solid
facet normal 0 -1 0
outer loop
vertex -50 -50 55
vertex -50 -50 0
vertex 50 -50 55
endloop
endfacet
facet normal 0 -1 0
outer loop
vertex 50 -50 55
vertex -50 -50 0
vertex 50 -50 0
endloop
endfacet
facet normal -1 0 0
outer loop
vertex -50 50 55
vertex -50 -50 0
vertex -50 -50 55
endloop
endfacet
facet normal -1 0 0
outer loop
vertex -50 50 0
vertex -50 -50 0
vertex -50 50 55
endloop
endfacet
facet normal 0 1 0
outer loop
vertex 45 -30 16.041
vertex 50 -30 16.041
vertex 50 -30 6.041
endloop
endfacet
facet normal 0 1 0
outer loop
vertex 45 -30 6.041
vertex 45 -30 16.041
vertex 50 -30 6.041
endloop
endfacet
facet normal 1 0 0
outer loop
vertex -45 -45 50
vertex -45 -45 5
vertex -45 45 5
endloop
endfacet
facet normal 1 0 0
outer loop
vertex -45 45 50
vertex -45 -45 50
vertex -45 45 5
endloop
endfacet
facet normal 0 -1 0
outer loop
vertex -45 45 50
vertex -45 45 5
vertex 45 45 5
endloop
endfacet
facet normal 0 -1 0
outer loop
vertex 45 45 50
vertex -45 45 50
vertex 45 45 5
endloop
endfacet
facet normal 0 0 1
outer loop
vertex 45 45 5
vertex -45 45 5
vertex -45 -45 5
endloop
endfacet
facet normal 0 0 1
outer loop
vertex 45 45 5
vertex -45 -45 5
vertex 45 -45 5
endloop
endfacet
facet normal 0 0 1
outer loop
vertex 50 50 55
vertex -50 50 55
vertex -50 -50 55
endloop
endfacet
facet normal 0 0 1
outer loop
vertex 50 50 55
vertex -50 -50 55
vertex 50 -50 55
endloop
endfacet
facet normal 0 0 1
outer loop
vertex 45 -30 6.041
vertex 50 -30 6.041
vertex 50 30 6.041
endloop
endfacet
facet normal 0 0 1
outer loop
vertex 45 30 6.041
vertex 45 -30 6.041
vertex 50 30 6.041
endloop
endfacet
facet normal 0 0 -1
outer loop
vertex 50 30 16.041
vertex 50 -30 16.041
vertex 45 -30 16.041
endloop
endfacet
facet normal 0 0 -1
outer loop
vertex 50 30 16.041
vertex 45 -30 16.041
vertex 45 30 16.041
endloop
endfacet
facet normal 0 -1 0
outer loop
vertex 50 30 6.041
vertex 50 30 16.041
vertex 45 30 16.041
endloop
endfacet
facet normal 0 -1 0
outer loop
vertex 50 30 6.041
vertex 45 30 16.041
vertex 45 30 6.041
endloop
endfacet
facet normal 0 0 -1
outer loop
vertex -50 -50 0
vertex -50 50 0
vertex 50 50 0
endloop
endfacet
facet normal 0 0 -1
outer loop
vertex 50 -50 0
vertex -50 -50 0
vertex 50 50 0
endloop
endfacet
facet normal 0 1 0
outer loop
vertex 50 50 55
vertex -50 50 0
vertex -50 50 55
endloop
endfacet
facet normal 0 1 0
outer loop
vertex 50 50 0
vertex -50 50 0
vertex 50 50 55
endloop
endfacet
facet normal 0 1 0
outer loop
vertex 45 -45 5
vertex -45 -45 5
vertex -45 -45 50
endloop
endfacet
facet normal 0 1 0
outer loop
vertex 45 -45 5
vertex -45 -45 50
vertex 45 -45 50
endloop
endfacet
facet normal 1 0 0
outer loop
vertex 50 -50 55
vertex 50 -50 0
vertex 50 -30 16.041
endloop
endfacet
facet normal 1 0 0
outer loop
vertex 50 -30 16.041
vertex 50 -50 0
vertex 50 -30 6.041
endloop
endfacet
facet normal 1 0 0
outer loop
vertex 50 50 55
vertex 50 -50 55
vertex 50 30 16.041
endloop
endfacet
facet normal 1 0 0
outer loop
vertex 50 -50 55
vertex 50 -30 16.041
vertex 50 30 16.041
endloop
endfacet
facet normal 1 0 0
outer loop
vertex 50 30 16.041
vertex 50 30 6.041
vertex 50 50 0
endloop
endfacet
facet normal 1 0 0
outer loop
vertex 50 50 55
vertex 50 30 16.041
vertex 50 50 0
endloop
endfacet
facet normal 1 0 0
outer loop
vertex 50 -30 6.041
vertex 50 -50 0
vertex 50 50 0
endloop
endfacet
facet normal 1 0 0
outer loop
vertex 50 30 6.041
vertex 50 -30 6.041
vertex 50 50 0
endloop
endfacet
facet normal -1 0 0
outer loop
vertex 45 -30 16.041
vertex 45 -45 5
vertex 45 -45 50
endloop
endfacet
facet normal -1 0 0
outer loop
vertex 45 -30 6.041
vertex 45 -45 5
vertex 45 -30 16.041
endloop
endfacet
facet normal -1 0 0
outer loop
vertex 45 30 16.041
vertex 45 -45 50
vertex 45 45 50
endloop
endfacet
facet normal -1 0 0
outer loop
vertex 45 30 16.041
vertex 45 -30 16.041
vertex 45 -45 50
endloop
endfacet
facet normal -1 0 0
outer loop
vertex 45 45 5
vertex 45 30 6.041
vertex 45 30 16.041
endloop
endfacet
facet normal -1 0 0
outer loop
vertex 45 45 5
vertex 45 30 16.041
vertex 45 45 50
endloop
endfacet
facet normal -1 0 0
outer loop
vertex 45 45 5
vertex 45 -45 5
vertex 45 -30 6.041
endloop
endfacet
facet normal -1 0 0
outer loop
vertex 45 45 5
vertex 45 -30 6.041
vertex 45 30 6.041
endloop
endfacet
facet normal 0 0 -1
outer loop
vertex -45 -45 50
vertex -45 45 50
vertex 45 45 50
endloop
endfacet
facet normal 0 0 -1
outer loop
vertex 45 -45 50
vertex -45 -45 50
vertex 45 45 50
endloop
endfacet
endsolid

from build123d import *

# Parameters (mm, degrees)
SKETCH1_W           = 100
SKETCH1_H           = 100
BOSS_EXTRUDE1_DEPTH = 50
SHELL1_T            = -5
SKETCH2_W           = 10
SKETCH2_H           = 60
CUT_EXTRUDE1_DEPTH  = 19
SKETCH3_W           = 100
SKETCH3_H           = 100
BOSS_EXTRUDE2_DEPTH = 5


with BuildPart() as part:
    # Sketch1 → Boss-Extrude1 (new body)
    with BuildSketch(Plane.XY):
        Rectangle(SKETCH1_W, SKETCH1_H)
    extrude(amount=BOSS_EXTRUDE1_DEPTH)

    # Shell1
    shell1_openings = [part.faces().sort_by_distance(p)[0] for p in [
        (0, 0, 50),
    ]]
    offset(amount=SHELL1_T, openings=shell1_openings, kind=Kind.INTERSECTION)

    # Sketch2 → Cut-Extrude1 (cut)
    with BuildSketch(Plane(origin=(50, 0, 0), x_dir=(0, 0, -1), z_dir=(1, 0, 0))):
        with Locations((-11.04097714, 0)):
            Rectangle(SKETCH2_W, SKETCH2_H)
    extrude(amount=-CUT_EXTRUDE1_DEPTH, mode=Mode.SUBTRACT)

    # Sketch3 → Boss-Extrude2 (add)
    with BuildSketch(Plane.XY.offset(50)):
        Rectangle(SKETCH3_W, SKETCH3_H)
    extrude(amount=BOSS_EXTRUDE2_DEPTH)


solid = part.part
